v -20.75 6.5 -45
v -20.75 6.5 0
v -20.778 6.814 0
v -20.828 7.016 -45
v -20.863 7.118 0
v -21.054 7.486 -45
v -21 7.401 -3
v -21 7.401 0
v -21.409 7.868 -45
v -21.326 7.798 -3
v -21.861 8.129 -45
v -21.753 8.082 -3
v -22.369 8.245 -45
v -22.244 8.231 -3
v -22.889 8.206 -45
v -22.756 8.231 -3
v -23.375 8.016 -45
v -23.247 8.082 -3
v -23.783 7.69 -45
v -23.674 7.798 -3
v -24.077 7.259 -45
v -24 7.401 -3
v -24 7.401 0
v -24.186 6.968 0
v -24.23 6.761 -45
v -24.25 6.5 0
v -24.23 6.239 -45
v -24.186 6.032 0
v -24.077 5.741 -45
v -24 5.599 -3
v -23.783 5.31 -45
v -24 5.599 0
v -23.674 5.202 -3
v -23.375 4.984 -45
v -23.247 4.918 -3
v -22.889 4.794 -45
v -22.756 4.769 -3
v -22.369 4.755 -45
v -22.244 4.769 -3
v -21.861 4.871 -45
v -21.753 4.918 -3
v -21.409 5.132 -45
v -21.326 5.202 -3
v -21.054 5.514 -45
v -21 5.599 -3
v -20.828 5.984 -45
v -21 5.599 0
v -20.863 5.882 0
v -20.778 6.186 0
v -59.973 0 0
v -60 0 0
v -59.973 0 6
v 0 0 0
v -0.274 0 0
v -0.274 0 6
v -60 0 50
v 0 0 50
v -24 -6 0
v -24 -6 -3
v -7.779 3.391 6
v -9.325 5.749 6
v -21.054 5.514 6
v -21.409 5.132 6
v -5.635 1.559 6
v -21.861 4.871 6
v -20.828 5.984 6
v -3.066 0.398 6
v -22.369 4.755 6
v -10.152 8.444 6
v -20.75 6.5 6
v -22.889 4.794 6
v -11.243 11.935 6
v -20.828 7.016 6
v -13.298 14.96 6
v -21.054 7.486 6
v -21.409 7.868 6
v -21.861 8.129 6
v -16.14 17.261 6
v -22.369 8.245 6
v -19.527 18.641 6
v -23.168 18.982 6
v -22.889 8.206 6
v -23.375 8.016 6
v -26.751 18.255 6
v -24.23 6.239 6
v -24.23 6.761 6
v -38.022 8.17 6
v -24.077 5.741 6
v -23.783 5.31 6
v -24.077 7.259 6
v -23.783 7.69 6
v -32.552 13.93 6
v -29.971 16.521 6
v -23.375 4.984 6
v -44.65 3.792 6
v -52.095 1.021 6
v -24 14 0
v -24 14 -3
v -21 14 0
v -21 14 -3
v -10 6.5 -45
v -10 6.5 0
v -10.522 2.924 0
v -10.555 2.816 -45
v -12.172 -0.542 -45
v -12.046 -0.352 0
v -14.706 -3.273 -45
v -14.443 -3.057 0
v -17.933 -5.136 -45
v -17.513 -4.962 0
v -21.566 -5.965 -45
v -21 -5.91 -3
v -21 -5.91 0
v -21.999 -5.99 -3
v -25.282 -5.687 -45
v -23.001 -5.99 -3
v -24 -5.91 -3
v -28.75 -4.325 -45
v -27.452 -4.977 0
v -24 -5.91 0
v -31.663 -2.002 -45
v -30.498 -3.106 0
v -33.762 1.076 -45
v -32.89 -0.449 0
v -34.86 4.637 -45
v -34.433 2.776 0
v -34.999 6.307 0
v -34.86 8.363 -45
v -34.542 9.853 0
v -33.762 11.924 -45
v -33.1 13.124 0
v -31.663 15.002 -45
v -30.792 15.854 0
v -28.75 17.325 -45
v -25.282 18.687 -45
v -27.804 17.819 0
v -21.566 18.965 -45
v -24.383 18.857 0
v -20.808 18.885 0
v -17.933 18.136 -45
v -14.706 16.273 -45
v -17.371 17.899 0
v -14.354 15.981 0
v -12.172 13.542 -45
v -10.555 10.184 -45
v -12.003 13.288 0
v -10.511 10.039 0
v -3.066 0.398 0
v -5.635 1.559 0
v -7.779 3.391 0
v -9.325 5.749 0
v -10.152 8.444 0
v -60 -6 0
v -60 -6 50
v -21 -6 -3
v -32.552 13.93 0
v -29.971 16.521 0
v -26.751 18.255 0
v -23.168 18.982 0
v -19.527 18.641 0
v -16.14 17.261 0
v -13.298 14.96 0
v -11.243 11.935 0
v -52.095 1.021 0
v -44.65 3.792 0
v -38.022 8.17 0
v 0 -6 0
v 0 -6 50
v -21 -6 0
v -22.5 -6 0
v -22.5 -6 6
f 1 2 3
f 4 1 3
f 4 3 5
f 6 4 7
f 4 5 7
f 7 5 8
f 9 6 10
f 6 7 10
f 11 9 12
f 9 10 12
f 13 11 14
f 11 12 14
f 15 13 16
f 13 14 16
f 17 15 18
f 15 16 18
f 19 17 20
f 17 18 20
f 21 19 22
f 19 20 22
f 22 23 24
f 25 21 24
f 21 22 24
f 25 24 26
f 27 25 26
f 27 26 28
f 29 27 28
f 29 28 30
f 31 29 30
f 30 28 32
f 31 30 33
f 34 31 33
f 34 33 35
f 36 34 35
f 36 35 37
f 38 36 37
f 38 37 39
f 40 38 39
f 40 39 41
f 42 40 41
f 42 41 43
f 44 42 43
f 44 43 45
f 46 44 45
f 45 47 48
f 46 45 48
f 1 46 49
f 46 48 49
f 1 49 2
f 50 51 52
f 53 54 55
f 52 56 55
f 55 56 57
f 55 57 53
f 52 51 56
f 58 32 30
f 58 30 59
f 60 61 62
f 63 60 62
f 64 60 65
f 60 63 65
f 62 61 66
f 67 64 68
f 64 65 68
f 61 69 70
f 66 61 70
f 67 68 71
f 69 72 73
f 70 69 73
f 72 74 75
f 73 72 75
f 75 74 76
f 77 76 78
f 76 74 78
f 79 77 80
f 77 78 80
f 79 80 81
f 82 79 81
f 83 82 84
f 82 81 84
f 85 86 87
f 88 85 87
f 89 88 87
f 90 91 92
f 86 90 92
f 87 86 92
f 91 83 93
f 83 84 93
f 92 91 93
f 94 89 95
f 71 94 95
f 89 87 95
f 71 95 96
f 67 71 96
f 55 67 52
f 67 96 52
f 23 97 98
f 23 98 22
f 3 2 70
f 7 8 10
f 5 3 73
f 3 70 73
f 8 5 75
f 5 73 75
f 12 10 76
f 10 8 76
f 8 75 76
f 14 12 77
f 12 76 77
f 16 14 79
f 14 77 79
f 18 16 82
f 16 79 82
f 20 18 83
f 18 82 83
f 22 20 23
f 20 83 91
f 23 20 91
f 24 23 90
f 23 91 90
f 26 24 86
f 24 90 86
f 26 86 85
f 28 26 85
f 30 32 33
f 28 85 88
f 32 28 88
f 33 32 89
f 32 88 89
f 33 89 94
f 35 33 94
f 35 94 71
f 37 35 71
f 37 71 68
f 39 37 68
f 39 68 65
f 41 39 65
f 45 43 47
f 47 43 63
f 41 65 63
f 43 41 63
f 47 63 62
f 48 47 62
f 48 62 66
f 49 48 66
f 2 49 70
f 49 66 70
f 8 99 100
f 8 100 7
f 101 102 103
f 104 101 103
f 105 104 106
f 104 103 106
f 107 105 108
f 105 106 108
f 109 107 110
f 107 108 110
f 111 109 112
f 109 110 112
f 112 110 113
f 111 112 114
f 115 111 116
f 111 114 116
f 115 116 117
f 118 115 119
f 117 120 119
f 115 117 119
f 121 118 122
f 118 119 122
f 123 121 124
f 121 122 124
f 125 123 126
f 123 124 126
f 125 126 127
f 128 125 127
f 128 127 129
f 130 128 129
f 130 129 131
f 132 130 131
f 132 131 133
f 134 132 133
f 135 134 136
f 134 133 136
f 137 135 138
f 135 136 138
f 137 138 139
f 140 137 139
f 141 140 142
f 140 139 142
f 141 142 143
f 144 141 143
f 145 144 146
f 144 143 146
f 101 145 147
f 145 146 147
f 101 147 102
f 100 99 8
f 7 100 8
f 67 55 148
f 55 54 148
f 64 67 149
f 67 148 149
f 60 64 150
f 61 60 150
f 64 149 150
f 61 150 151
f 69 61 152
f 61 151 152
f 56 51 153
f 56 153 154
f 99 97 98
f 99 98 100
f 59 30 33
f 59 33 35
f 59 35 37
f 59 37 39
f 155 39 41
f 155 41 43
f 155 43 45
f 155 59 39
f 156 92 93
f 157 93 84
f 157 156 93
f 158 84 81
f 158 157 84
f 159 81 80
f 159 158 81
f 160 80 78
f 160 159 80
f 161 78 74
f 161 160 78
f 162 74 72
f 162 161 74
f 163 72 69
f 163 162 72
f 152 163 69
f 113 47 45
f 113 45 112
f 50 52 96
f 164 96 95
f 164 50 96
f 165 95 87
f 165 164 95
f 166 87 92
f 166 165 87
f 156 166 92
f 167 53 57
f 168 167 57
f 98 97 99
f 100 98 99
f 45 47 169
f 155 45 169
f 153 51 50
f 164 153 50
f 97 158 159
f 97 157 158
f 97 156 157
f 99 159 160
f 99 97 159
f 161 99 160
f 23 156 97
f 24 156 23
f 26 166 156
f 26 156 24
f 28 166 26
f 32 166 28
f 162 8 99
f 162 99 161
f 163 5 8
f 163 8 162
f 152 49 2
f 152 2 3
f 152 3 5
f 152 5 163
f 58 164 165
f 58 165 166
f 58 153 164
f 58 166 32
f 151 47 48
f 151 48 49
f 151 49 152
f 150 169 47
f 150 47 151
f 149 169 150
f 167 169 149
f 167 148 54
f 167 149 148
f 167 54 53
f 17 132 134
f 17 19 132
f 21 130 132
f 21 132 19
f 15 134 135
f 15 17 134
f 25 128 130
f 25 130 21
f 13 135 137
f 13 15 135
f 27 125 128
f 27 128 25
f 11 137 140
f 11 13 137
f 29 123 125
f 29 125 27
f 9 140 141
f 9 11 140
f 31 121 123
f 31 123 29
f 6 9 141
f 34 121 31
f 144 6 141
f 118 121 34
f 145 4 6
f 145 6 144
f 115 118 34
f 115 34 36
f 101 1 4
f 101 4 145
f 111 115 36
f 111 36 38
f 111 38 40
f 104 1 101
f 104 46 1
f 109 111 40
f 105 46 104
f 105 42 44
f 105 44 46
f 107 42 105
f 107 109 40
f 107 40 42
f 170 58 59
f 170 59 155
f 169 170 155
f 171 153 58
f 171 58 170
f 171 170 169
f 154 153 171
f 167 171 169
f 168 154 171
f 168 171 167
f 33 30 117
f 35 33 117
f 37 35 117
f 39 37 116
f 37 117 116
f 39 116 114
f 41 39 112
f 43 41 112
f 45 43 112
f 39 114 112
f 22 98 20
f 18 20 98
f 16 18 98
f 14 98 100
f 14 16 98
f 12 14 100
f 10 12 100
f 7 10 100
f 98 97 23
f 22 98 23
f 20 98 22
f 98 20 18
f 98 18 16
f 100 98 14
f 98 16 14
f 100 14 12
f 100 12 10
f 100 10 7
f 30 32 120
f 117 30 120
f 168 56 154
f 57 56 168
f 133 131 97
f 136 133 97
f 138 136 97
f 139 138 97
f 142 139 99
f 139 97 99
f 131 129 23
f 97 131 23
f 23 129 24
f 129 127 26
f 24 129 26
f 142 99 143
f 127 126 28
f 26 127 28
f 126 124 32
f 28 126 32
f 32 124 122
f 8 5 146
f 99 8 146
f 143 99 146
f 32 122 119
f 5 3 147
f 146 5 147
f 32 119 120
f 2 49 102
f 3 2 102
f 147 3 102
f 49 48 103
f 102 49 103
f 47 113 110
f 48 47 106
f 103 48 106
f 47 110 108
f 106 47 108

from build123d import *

# Parameters (mm, degrees)
F0_W         = 60
F0_H         = 50
F1_DEPTH     = 6
F2_R         = 12.5
F3_DEPTH     = 6
F4_W         = 3
F4_H         = 20
F5_DEPTH     = 3
F6_R         = 12.5
F7_DEPTH     = 45
F8_R         = 1.75
F9_DEPTH     = 51.001
F10_T1_DEPTH = 6
F11_R        = 10
F12_DEPTH    = 3


# Not quite as in the source:
# - a fillet or chamfer that OpenCascade refuses, or shapes differently, is made with other operations: its cross-section is extruded or revolved along the edge and cut away or added


with BuildPart() as f1:
    # F0 (on Front) → F1 (new body)
    with BuildSketch(Plane.XZ):
        with Locations((-30, 25)):
            Rectangle(F0_W, F0_H)
    extrude(amount=F1_DEPTH)

    # F2 (on face) → F3 (join)
    with BuildSketch(Plane(origin=(0, 0, 0), x_dir=(1, 0, 0), z_dir=(0, 0, -1))):
        with Locations((-22.5, -6.5)):
            Circle(F2_R)
    extrude(amount=-F3_DEPTH)

    # F4 (on face) → F5 (join)
    with BuildSketch(Plane(origin=(0, 0, 0), x_dir=(1, 0, 0), z_dir=(0, 0, -1))):
        with Locations((-22.5, -4)):
            Rectangle(F4_W, F4_H)
    extrude(amount=F5_DEPTH)


with BuildPart() as f7:
    # F6 (on face) → F7 (new body)
    with BuildSketch(Plane(origin=(0, 0, 0), x_dir=(1, 0, 0), z_dir=(0, 0, -1))):
        with Locations((-22.5, -6.5)):
            Circle(F6_R)
    extrude(amount=F7_DEPTH)


with BuildPart() as f9_tool:
    # F8 (on face) → F9 (new body, through all)
    with BuildSketch(Plane.XY.offset(6)):
        with Locations((-22.5, 6.5)):
            Circle(F8_R)
    extrude(amount=-F9_DEPTH)


with BuildPart() as f1_1:
    add(f1.part)

    # F9: cut by f9_tool
    add(f9_tool.part, mode=Mode.SUBTRACT)

    # F10: fillet of radius 35 on 2 edges, made by hand

    # F10_s2 → F10_t1 (join)
    with BuildSketch(Plane.XY):
        with BuildLine():
            ThreePointArc((-59.9999942526, -0.0003999587), (-44.6241465011, 3.8051050521), (-32.5003627011, 13.9988496455))
            Line((-32.5003627011, 13.9988496455), (-29.7001088019, 11.8990575092))
            ThreePointArc((-29.7001088019, 11.8990575092), (-31.4894392952, 6.9342461078), (-30.1874293614, 1.8200407762))
            Line((-30.1874293614, 1.8200407762), (-33.177078252, -3.5000784157))
            Line((-33.177078252, -3.5000784157), (-59.9497035085, -3.5001170554))
            Line((-59.9497035085, -3.5001170554), (-59.9999942526, -0.0003999587))
        make_face()
    extrude(amount=F10_T1_DEPTH)

    # F11
    f11_edges = [f1_1.edges().sort_by_distance(p)[0] for p in [
        (-11.822922, 0, 3),
    ]]
    fillet(f11_edges, radius=F11_R)


with BuildPart() as f7_1:
    add(f7.part)

    # F9: cut by f9_tool
    add(f9_tool.part, mode=Mode.SUBTRACT)

    # F4 (on face) → F12 (cut)
    with BuildSketch(Plane(origin=(0, 0, 0), x_dir=(1, 0, 0), z_dir=(0, 0, -1))):
        with Locations((-22.5, -4)):
            Rectangle(F4_W, F4_H)
    extrude(amount=F12_DEPTH, mode=Mode.SUBTRACT)


solid = Compound([f1_1.part, f7_1.part])
